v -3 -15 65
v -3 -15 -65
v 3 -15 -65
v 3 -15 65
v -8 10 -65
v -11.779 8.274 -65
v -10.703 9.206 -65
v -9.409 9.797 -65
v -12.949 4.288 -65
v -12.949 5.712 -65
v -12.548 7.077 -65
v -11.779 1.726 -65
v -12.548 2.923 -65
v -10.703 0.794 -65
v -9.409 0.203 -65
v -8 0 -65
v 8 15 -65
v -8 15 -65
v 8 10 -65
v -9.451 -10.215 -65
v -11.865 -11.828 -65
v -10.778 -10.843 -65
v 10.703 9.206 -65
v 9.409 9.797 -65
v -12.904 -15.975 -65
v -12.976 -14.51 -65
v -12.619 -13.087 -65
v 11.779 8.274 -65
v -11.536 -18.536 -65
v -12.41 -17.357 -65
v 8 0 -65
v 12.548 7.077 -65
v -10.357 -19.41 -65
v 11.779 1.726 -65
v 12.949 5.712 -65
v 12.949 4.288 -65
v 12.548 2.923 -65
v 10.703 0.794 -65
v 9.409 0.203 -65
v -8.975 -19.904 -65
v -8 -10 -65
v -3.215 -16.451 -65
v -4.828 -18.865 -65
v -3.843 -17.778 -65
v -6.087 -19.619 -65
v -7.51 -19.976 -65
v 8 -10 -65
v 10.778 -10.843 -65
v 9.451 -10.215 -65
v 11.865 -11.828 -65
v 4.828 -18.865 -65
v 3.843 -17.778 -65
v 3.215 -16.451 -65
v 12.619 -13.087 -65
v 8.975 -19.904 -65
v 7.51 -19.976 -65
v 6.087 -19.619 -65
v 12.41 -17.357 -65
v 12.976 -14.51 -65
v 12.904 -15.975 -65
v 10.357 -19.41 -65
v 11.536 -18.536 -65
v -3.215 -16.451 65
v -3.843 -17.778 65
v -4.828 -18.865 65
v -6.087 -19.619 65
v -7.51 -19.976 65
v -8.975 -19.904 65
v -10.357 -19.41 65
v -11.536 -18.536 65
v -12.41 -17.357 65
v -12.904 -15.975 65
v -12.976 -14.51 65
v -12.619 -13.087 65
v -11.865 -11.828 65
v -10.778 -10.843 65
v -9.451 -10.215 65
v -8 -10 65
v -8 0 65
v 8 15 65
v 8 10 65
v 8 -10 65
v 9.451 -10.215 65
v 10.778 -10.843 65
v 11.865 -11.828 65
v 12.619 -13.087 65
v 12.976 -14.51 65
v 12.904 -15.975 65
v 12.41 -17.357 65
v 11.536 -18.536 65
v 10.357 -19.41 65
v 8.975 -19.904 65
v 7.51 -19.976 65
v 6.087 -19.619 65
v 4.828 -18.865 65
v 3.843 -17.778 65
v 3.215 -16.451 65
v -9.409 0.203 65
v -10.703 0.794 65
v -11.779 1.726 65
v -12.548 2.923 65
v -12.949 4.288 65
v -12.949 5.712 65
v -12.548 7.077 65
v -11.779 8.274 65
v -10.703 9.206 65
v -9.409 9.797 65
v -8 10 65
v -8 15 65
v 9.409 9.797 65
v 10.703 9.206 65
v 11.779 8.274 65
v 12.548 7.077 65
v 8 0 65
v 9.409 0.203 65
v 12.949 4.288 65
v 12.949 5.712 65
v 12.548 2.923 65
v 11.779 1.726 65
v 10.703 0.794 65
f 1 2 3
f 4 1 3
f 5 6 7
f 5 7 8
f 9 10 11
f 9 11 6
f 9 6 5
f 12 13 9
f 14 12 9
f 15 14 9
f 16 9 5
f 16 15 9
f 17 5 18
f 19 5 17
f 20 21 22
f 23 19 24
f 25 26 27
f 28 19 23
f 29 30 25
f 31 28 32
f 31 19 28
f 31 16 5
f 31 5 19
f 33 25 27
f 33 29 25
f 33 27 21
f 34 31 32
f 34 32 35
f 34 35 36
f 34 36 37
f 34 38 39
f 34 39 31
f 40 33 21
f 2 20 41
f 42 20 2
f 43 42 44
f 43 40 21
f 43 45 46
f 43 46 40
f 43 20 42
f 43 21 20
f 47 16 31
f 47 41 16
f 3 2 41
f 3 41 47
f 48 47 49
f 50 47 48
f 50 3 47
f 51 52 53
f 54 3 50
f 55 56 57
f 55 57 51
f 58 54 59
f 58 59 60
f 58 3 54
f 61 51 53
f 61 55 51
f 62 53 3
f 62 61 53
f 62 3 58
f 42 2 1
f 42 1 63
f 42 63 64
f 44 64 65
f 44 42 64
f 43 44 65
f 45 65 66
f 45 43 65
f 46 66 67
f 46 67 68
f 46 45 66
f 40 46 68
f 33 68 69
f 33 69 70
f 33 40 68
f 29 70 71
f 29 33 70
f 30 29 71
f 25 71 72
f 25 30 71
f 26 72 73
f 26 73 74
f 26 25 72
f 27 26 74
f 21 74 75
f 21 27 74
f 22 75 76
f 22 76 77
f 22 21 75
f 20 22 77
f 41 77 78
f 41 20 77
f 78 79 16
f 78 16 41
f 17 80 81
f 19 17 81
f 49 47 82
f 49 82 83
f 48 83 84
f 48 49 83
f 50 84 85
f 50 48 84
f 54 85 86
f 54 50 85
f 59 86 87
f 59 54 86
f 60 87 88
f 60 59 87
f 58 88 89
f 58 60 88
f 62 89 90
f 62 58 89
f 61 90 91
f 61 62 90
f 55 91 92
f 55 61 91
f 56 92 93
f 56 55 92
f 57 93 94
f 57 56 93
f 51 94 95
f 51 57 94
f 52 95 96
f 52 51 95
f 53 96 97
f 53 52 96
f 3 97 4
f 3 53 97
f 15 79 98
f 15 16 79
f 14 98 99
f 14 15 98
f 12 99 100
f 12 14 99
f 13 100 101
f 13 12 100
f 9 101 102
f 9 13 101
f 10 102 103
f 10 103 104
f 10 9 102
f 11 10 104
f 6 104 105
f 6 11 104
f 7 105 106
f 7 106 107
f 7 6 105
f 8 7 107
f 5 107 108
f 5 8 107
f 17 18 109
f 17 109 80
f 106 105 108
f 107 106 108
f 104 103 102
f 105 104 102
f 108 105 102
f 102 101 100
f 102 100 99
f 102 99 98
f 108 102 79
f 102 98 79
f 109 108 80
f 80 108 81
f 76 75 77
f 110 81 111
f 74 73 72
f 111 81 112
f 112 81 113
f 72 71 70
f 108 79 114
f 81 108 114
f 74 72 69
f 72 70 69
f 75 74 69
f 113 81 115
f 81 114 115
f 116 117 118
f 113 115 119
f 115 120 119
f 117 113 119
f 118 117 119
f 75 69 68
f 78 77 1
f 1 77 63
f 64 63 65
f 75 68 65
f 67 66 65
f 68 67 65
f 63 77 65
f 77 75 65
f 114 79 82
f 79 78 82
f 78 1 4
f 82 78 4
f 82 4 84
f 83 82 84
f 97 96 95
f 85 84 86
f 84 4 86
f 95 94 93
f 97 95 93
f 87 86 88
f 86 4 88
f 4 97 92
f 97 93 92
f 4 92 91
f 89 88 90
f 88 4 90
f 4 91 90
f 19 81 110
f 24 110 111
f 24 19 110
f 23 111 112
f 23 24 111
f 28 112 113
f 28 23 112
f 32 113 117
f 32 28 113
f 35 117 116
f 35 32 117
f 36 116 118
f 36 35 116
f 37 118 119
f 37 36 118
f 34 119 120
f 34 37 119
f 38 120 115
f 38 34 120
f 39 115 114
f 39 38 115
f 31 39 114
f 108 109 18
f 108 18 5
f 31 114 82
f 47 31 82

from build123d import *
from build123d.topology import SkipClean

# Parameters (mm, degrees)
SKETCH_1_R      = 5
SKETCH_1_W      = 16
SKETCH_1_H      = 30
EXTRUDE_1_DEPTH = 65


with BuildPart() as part:
    # Эскиз1 → Бобышка-Вытянуть1 (new, symmetric)
    with SkipClean():  # the faces are left unmerged after this step: merging them gives an invalid solid
        with BuildSketch(Plane(origin=(0, 0, 0), x_dir=(1, 0, 0), z_dir=(0, 0, -1))):
            with BuildLine():
                ThreePointArc((-8, 0), (-13, -5), (-8, -10))
                Line((-8, -10), (-8, 0))
            make_face()
            with BuildLine():
                Line((-8, 0), (-8, -10))
                ThreePointArc((-8, -10), (-4.464466094, -8.535533906), (-3, -5))
                ThreePointArc((-3, -5), (-4.464466094, -1.464466094), (-8, 0))
            make_face()
            with Locations((8, 15)):
                Circle(SKETCH_1_R)
            with Locations((8, -5)):
                Circle(SKETCH_1_R)
            with Locations((-8, -5)):
                Circle(SKETCH_1_R)
            with Locations((-8, 15)):
                Circle(SKETCH_1_R)
            Rectangle(SKETCH_1_W, SKETCH_1_H)
            with BuildLine():
                ThreePointArc((-3, 15), (-11.535533906, 18.535533906), (-8, 10))
                Line((-8, 10), (-8, 15))
                Line((-8, 15), (-3, 15))
            make_face()
            with BuildLine():
                Line((-8, 15), (-8, 10))
                ThreePointArc((-8, 10), (-4.464466094, 11.464466094), (-3, 15))
                Line((-3, 15), (-8, 15))
            make_face()
            with BuildLine():
                ThreePointArc((3, 15), (4.464466094, 11.464466094), (8, 10))
                Line((8, 10), (8, 15))
                Line((8, 15), (3, 15))
            make_face()
            with BuildLine():
                Line((8, 15), (8, 10))
                ThreePointArc((8, 10), (11.535533906, 11.464466094), (13, 15))
                ThreePointArc((13, 15), (8, 20), (3, 15))
                Line((3, 15), (8, 15))
            make_face()
            with BuildLine():
                ThreePointArc((8, 0), (3, -5), (8, -10))
                Line((8, -10), (8, 0))
            make_face()
            with BuildLine():
                Line((8, 0), (8, -10))
                ThreePointArc((8, -10), (11.535533906, -8.535533906), (13, -5))
                ThreePointArc((13, -5), (11.535533906, -1.464466094), (8, 0))
            make_face()
        extrude(amount=EXTRUDE_1_DEPTH, both=True)


solid = part.part
